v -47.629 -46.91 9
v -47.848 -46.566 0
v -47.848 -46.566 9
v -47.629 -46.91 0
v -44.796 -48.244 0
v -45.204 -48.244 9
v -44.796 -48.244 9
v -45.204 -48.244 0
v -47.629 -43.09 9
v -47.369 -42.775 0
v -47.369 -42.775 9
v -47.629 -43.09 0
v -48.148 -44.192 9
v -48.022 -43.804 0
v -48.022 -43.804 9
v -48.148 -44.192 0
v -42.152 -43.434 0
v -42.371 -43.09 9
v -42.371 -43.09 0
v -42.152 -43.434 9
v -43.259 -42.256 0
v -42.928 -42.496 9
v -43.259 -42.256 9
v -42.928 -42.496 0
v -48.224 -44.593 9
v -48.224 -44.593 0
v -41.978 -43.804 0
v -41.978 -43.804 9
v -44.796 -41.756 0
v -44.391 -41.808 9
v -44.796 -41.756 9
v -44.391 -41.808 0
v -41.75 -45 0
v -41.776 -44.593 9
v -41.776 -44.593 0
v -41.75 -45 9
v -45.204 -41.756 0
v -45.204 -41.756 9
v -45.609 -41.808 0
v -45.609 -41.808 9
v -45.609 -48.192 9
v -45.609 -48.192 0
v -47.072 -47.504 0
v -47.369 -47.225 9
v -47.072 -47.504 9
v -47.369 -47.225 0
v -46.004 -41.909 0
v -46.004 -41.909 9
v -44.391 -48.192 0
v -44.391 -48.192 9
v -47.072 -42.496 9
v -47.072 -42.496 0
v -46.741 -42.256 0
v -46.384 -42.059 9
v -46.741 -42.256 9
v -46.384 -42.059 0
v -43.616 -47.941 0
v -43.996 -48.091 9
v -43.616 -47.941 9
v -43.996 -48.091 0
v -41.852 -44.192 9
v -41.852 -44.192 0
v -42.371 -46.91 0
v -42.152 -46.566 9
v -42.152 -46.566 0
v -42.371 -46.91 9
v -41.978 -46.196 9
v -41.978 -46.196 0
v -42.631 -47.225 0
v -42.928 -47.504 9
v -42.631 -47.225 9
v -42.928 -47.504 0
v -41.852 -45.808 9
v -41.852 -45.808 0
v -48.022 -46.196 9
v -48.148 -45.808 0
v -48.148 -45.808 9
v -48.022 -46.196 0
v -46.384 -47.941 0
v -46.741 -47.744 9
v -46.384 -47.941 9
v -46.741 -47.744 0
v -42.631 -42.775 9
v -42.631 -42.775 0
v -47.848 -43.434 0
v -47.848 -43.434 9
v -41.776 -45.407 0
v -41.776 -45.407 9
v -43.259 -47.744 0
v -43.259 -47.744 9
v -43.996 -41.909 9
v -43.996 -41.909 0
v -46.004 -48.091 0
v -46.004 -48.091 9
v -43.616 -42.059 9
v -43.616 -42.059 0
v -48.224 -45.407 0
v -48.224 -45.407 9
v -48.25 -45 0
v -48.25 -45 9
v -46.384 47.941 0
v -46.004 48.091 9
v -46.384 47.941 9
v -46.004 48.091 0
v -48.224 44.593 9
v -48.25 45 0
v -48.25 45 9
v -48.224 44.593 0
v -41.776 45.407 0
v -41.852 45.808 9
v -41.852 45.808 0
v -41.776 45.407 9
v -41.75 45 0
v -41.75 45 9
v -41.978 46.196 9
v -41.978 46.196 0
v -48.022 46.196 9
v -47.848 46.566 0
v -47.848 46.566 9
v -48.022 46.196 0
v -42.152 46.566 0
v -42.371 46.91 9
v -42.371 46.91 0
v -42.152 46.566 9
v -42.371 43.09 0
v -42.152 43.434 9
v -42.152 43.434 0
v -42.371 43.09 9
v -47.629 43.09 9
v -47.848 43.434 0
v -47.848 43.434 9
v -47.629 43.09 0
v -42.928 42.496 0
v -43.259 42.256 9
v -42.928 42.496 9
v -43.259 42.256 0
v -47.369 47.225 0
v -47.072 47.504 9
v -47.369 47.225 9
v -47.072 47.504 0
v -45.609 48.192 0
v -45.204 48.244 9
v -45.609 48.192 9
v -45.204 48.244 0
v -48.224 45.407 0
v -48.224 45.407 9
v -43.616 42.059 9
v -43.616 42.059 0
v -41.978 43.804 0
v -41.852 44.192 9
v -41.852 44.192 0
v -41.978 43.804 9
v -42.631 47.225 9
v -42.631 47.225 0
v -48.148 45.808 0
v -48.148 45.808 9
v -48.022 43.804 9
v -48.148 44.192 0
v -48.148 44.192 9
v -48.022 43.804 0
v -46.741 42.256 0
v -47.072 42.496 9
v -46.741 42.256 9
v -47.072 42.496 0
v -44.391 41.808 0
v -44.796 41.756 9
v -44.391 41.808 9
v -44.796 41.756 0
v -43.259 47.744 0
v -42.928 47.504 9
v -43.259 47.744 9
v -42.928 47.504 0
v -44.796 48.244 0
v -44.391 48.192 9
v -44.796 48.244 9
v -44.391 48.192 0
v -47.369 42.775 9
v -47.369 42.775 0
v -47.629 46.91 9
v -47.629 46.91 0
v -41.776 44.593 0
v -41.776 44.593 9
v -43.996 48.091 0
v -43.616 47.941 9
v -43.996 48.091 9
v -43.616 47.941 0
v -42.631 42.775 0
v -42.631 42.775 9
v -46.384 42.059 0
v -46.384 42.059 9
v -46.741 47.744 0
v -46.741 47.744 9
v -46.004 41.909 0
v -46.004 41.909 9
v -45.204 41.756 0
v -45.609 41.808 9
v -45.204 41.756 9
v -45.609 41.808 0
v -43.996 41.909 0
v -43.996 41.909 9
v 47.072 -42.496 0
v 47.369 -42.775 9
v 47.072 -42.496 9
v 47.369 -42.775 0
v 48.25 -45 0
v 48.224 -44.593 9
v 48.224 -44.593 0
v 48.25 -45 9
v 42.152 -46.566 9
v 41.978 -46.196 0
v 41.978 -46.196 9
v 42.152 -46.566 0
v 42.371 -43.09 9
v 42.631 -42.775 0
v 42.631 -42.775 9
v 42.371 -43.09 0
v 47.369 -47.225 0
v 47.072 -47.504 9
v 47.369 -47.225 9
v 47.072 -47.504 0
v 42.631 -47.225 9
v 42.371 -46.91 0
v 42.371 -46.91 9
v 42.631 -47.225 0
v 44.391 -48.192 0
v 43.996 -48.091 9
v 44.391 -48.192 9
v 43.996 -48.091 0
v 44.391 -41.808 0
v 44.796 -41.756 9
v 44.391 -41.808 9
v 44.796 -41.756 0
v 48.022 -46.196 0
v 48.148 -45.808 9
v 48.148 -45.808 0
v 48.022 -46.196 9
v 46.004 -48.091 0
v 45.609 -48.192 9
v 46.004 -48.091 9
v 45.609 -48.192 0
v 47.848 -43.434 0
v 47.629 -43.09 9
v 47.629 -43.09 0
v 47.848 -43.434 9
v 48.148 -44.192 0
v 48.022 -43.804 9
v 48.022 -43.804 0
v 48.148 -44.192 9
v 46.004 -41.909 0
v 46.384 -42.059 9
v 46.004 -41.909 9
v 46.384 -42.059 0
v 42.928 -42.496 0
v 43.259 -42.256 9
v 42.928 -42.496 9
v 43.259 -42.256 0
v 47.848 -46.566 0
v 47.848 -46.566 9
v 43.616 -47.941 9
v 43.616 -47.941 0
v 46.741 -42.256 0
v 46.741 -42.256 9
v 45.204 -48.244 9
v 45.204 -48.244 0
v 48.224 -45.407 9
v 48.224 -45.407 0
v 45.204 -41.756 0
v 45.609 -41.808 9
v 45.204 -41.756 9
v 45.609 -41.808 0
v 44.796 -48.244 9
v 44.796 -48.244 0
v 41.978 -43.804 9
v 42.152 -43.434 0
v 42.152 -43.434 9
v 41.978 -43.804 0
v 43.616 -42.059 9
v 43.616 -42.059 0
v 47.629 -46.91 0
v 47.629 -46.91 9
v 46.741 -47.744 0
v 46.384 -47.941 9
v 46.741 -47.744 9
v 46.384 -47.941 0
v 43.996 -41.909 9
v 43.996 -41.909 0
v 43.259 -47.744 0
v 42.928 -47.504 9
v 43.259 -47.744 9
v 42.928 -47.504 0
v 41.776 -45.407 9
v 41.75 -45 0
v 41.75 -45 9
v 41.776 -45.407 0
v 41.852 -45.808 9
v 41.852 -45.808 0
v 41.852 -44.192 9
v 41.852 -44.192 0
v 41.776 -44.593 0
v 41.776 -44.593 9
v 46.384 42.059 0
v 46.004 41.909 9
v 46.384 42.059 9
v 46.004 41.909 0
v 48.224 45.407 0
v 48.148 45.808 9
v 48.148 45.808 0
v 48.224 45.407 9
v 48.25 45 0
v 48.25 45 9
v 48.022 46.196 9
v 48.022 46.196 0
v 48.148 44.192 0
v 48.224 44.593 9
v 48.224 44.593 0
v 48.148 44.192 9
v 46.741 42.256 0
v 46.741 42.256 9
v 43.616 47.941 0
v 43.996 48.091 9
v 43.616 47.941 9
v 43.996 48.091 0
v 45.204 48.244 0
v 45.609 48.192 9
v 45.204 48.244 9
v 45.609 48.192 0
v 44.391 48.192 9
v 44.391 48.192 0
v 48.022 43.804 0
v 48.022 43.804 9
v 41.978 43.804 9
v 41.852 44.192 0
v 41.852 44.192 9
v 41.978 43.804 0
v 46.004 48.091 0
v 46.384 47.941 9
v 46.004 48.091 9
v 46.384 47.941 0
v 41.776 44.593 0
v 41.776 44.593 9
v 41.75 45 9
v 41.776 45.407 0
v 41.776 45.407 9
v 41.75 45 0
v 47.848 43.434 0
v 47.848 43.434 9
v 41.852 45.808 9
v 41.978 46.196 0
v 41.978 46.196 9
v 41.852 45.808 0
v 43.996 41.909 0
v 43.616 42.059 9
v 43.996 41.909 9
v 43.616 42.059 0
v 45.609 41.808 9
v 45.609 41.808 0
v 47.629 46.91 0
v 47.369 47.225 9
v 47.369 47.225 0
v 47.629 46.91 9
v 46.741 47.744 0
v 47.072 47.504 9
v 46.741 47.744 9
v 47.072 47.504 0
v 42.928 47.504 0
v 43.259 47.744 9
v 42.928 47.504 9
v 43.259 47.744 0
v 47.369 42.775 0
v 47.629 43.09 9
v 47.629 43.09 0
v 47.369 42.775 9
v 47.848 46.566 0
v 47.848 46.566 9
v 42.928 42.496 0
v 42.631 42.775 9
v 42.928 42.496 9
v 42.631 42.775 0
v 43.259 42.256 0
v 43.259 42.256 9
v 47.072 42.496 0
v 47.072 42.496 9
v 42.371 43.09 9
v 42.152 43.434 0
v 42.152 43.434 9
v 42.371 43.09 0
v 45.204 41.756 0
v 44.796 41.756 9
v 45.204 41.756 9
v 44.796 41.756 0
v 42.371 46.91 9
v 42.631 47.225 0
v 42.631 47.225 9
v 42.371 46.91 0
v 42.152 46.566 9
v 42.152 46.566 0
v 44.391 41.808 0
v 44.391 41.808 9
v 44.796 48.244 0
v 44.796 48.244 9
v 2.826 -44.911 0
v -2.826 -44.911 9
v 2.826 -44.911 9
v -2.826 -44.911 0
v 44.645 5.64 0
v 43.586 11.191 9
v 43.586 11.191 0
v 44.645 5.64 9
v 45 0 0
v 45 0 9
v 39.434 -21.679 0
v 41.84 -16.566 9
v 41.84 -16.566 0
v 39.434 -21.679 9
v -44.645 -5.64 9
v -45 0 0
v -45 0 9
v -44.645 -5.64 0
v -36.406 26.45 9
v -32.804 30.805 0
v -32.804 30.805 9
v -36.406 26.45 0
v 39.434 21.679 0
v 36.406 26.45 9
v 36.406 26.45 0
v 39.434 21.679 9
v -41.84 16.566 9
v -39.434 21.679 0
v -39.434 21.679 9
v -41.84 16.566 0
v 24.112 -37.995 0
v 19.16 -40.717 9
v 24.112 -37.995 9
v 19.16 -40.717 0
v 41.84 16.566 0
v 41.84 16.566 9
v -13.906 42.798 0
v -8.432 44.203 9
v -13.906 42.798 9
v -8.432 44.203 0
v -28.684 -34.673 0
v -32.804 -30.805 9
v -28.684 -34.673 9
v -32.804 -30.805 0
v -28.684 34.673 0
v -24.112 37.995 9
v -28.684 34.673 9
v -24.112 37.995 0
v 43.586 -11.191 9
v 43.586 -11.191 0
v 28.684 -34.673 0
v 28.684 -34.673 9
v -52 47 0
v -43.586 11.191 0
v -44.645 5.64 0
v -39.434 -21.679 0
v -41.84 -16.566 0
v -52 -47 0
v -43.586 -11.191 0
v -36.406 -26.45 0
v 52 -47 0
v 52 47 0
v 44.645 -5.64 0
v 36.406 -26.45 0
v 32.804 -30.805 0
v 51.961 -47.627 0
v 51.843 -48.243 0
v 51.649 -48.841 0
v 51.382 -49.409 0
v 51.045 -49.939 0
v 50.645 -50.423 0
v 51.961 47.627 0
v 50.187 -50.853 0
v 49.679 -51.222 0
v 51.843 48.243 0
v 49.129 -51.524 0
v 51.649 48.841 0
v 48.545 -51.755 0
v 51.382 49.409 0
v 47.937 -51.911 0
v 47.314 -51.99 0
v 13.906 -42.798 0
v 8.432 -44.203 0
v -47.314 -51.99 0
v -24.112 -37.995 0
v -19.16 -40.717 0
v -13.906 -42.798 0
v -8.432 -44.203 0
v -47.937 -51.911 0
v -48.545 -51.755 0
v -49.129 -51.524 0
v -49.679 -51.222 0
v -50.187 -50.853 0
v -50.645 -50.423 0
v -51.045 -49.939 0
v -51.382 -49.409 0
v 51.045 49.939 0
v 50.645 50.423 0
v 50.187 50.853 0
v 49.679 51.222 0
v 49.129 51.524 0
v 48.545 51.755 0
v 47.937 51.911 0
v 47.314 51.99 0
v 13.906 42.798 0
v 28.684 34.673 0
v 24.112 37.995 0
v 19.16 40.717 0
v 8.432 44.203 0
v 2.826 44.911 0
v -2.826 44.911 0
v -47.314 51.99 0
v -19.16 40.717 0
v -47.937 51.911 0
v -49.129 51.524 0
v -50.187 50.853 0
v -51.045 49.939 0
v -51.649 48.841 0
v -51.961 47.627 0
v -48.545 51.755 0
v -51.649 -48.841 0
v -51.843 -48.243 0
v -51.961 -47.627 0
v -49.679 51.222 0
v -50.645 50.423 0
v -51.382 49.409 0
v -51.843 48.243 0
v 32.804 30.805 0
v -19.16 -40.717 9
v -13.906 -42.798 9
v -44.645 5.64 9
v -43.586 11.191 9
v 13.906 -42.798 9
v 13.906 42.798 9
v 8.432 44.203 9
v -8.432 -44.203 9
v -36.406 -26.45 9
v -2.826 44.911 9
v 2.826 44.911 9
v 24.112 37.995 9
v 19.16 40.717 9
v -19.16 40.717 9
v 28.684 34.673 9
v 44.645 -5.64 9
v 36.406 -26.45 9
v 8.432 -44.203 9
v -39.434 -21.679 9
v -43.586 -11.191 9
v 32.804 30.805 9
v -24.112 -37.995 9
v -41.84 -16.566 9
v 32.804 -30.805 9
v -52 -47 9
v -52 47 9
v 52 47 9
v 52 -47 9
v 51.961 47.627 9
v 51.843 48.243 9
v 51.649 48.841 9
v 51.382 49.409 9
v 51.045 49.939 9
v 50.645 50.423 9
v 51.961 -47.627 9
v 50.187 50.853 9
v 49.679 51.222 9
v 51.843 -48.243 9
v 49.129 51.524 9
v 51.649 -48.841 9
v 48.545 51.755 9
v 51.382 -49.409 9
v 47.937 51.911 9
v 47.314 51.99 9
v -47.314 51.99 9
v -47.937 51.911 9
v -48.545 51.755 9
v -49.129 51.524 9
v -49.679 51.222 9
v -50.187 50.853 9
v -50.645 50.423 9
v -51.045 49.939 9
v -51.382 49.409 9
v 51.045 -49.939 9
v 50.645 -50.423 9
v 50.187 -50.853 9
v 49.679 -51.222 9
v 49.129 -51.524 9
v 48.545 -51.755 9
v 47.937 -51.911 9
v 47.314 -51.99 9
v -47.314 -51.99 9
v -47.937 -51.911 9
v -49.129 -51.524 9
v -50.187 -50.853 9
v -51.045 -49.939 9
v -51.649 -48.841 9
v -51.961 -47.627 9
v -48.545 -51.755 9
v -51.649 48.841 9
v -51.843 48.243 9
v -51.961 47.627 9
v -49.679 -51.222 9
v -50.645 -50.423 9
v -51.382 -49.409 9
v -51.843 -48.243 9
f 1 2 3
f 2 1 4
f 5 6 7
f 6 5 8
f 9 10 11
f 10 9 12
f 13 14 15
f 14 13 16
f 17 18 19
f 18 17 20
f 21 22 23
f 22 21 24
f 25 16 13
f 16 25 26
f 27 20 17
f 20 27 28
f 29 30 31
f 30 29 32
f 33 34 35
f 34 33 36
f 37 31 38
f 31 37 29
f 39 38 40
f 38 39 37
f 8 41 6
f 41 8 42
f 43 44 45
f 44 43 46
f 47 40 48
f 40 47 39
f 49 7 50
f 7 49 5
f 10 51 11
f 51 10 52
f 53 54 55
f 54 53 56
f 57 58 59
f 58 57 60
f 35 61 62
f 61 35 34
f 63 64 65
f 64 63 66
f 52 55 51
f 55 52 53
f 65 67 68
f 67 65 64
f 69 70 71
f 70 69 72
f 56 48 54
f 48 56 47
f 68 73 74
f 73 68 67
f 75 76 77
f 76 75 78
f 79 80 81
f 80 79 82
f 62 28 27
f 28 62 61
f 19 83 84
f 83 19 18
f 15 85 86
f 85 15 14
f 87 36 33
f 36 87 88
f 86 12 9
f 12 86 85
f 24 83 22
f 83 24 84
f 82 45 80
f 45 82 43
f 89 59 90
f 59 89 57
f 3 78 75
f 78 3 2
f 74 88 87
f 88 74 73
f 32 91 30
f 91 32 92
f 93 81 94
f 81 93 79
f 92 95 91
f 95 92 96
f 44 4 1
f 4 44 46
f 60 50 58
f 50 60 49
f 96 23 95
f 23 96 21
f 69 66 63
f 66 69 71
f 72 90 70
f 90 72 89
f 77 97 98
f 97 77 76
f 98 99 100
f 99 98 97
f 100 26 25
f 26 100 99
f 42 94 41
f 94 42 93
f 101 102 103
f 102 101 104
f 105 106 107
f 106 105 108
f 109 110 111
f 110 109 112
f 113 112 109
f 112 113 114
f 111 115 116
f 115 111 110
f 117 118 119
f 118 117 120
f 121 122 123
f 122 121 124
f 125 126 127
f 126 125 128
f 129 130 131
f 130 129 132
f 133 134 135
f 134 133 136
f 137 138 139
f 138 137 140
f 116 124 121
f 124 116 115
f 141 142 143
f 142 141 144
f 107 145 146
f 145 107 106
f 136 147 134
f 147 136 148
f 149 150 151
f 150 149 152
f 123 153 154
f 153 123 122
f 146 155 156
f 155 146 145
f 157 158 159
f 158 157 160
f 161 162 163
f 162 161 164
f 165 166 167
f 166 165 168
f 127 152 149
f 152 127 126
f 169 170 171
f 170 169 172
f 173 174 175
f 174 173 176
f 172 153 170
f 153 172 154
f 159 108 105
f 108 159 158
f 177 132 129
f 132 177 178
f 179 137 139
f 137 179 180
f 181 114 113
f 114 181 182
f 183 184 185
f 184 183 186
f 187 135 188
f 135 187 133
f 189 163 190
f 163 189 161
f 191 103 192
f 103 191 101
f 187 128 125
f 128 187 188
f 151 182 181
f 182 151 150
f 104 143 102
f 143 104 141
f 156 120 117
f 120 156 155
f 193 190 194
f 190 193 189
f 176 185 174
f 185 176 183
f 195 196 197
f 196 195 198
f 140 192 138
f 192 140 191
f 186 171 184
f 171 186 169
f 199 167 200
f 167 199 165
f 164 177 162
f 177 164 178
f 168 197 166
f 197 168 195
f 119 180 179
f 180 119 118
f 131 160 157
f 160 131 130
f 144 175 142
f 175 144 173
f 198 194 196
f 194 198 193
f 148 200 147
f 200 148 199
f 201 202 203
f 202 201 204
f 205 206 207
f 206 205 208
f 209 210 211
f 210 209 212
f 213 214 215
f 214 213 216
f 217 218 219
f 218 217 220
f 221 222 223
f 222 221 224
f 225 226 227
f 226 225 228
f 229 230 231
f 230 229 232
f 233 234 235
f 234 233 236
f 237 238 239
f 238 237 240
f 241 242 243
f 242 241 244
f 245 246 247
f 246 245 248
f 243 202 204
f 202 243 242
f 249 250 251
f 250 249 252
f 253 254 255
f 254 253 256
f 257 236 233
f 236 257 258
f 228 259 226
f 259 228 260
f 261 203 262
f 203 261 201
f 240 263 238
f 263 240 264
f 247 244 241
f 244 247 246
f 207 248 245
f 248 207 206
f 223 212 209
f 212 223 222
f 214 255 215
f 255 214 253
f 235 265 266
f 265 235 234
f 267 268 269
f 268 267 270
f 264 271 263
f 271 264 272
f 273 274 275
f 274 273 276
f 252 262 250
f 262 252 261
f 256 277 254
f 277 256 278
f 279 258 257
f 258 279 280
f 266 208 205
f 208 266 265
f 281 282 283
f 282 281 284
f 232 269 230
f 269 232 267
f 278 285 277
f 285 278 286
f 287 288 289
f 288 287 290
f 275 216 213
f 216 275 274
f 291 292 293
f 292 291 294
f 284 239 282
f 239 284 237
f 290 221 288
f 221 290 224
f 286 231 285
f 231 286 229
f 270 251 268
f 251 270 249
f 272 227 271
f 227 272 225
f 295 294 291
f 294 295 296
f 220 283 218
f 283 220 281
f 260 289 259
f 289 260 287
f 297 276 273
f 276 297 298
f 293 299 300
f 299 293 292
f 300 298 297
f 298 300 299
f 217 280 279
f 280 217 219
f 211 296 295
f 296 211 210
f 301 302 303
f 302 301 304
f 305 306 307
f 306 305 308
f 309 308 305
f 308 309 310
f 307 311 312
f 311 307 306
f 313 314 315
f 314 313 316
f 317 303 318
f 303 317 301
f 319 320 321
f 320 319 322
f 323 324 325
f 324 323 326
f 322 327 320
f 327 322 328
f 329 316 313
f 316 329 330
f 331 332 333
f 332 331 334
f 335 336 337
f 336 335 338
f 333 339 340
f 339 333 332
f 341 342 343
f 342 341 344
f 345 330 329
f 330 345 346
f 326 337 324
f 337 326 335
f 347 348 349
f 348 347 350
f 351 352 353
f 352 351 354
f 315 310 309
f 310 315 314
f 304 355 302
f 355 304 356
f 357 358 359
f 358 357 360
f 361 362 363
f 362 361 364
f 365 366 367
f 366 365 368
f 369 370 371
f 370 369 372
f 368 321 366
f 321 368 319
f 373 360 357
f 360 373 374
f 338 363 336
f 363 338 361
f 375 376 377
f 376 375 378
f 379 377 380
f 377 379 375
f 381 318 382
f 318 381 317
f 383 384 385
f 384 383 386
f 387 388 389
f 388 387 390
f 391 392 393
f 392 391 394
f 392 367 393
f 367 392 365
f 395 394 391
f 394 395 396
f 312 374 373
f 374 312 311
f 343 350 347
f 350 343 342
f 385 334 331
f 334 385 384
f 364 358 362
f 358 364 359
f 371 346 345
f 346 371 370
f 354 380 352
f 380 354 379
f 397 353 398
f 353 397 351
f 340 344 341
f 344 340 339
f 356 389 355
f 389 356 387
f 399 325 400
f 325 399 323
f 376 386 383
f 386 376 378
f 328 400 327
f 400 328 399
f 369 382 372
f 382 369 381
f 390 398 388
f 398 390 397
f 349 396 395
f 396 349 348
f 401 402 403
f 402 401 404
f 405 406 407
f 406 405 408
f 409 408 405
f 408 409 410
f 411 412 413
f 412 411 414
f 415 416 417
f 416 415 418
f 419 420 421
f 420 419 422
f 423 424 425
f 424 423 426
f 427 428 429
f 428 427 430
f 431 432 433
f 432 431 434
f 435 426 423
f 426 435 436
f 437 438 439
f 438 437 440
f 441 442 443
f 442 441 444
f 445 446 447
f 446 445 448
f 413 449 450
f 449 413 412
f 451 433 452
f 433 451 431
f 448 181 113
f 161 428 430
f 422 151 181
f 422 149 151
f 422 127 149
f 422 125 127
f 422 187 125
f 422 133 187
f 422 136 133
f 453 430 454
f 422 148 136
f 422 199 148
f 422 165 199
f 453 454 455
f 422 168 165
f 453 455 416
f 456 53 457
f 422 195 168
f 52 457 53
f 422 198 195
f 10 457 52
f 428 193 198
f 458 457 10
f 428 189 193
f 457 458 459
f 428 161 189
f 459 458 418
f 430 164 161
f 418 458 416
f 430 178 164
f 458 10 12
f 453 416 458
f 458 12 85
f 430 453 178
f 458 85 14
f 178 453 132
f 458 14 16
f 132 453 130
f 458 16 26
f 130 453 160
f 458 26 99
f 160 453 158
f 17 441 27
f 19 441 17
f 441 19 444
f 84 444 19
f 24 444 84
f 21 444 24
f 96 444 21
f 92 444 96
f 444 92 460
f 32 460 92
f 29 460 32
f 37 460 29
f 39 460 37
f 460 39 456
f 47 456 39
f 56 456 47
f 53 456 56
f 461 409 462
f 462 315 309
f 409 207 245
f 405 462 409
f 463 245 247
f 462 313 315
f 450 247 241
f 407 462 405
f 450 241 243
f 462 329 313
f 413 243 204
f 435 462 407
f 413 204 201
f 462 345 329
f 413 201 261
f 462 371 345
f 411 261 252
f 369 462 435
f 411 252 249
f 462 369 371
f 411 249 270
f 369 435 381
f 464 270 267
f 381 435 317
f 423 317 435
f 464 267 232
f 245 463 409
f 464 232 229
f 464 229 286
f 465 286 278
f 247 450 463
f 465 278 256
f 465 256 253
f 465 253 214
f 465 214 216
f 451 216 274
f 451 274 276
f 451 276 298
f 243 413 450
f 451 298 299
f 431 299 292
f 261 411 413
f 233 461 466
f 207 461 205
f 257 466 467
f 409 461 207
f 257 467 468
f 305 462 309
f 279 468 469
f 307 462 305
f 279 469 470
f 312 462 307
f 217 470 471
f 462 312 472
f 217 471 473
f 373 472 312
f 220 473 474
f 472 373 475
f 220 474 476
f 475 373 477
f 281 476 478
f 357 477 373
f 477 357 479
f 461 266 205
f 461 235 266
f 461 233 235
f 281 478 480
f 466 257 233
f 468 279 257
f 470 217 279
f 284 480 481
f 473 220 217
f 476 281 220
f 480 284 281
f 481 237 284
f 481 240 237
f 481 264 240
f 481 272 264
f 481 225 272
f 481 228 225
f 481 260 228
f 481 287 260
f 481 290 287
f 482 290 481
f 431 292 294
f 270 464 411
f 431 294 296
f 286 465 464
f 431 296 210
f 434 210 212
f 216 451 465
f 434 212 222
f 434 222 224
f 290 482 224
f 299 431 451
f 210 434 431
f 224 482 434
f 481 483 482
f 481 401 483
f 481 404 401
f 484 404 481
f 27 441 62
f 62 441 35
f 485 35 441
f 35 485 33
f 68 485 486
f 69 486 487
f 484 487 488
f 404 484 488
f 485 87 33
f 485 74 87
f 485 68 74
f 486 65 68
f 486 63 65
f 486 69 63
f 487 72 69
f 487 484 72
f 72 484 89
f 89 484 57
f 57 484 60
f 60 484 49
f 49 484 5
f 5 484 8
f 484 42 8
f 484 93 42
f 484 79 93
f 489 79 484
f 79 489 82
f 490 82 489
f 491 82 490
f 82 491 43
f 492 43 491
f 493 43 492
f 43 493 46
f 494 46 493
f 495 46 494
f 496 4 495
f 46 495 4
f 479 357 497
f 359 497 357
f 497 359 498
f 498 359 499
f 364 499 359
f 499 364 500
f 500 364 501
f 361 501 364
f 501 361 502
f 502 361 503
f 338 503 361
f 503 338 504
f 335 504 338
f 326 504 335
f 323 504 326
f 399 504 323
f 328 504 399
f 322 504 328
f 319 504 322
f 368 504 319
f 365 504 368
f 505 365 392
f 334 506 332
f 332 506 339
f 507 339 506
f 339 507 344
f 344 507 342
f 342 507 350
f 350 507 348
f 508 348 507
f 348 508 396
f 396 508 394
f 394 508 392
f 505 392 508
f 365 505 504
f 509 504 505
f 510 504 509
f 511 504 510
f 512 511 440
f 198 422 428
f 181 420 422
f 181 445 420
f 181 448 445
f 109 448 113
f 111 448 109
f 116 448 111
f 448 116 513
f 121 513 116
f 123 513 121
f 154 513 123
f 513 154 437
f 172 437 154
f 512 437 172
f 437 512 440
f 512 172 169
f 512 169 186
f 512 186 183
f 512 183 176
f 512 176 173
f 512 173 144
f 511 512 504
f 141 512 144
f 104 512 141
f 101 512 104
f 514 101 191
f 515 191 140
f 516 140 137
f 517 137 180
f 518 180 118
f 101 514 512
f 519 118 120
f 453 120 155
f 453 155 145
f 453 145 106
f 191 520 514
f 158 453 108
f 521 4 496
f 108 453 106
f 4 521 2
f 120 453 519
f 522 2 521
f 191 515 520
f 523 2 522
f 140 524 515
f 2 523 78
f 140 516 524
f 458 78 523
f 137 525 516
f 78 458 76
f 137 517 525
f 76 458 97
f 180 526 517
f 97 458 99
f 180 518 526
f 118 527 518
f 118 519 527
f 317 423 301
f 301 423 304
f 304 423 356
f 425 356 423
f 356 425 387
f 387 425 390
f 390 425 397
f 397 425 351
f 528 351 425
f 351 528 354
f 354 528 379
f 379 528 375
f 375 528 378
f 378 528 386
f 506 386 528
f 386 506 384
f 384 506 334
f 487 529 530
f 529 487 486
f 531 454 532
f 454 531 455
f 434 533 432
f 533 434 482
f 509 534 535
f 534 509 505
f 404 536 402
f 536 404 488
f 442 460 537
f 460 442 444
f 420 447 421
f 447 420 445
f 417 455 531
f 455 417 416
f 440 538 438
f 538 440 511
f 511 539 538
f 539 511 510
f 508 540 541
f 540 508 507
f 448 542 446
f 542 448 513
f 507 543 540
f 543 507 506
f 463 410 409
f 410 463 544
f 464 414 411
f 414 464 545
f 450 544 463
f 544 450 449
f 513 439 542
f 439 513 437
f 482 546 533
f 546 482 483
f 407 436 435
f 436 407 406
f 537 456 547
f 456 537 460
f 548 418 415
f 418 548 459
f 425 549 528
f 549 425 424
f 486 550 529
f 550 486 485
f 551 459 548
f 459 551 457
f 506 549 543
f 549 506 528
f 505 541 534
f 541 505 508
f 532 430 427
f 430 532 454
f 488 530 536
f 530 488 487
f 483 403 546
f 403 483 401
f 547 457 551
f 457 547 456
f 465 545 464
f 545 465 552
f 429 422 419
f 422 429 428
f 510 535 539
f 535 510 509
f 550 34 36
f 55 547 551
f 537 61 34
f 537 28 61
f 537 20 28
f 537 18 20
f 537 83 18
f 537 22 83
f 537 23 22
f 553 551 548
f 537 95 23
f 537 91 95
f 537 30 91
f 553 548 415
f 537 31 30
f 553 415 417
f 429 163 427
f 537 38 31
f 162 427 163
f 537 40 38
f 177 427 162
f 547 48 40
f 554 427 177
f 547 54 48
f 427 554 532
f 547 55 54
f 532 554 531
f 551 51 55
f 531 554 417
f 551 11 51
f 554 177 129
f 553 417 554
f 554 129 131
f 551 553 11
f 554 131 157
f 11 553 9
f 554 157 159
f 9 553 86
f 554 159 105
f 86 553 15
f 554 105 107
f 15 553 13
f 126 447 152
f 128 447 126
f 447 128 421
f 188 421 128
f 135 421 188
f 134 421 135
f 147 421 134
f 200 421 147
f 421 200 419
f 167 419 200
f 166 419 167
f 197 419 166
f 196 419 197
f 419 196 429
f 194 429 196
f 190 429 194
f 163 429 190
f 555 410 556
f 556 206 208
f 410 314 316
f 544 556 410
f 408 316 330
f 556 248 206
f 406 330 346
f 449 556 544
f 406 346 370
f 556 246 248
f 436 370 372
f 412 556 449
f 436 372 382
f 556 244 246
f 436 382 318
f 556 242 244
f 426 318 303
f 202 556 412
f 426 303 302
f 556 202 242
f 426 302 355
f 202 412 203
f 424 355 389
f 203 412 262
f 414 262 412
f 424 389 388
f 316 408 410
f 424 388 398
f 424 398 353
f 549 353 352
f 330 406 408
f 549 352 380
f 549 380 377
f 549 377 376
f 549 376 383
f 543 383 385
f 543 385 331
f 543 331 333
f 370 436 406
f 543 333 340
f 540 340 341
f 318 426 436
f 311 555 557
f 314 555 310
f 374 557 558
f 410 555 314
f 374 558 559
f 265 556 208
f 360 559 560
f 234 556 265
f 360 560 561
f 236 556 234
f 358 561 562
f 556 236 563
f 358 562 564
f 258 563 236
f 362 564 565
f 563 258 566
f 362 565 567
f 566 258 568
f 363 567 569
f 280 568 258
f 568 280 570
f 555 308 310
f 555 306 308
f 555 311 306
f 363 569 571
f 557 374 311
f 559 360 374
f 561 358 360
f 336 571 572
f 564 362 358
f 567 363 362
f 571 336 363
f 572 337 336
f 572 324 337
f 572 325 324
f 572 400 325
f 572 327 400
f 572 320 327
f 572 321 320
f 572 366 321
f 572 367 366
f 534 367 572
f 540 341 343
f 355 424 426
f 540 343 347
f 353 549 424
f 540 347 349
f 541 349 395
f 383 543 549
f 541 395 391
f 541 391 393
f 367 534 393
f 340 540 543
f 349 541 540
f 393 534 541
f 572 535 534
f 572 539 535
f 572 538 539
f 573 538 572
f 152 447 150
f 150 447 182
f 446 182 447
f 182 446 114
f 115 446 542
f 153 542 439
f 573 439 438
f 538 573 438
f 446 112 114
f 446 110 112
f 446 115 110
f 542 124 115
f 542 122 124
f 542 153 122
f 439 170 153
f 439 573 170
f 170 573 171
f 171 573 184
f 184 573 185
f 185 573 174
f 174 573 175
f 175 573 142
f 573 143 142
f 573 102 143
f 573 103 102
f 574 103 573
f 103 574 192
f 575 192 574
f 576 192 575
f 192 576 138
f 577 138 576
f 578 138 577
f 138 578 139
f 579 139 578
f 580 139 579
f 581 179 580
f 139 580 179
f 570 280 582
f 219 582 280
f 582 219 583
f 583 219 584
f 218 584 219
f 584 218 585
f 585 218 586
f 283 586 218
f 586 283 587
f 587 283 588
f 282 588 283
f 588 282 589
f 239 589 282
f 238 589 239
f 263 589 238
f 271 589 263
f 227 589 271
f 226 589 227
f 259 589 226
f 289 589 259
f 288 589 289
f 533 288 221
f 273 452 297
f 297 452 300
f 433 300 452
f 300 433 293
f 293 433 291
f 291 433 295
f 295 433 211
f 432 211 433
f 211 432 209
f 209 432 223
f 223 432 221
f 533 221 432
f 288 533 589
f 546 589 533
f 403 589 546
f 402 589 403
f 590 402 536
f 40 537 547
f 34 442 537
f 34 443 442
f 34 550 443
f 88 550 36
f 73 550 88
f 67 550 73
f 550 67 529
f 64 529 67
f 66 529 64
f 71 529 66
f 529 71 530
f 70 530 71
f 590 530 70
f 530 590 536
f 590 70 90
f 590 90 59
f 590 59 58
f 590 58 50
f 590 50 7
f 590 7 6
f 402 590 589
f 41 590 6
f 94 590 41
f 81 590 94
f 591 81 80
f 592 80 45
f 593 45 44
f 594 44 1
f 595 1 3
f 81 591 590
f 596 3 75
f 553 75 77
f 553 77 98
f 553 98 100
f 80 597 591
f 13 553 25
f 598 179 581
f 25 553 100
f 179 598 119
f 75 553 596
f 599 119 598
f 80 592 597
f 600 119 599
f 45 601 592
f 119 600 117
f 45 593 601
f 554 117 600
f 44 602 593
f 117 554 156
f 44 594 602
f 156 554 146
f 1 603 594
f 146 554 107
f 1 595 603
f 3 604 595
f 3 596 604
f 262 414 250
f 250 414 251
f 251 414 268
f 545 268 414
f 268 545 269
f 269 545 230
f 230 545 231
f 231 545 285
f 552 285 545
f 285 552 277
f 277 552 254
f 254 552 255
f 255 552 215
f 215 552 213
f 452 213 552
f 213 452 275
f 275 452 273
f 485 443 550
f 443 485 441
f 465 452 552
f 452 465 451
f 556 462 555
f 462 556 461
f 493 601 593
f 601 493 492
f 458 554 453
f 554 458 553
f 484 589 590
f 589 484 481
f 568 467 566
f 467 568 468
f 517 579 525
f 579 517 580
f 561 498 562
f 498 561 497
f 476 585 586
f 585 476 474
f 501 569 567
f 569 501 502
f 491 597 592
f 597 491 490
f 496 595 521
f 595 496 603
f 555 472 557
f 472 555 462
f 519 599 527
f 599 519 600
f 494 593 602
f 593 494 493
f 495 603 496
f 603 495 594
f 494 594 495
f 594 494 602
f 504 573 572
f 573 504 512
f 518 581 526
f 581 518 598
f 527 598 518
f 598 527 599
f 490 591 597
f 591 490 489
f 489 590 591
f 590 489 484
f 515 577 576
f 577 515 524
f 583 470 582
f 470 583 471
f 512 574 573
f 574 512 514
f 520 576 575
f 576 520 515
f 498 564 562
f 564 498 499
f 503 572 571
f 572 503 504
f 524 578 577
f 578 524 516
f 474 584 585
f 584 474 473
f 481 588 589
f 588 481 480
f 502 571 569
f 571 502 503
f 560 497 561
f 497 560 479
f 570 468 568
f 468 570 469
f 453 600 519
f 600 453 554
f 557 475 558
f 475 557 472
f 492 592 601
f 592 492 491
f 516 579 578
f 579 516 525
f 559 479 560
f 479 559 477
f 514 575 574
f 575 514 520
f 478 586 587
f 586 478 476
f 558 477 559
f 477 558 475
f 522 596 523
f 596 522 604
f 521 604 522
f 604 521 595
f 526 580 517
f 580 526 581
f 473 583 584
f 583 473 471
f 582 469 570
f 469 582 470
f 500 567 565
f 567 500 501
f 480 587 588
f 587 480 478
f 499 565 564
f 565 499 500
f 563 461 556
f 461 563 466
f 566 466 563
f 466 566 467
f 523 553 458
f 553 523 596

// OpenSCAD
$fn = 50;


difference() {
	union() {
		hull() {
			translate(v = [-47.0000000000, 47.0000000000, 0]) {
				cylinder(h = 9, r = 5);
			}
			translate(v = [47.0000000000, 47.0000000000, 0]) {
				cylinder(h = 9, r = 5);
			}
			translate(v = [-47.0000000000, -47.0000000000, 0]) {
				cylinder(h = 9, r = 5);
			}
			translate(v = [47.0000000000, -47.0000000000, 0]) {
				cylinder(h = 9, r = 5);
			}
		}
	}
	union() {
		#translate(v = [-45.0000000000, -45.0000000000, -100.0000000000]) {
			cylinder(h = 200, r = 3.2500000000);
		}
		#translate(v = [-45.0000000000, 45.0000000000, -100.0000000000]) {
			cylinder(h = 200, r = 3.2500000000);
		}
		#translate(v = [45.0000000000, -45.0000000000, -100.0000000000]) {
			cylinder(h = 200, r = 3.2500000000);
		}
		#translate(v = [45.0000000000, 45.0000000000, -100.0000000000]) {
			cylinder(h = 200, r = 3.2500000000);
		}
		#cylinder(h = 9, r = 45.0000000000);
	}
}
